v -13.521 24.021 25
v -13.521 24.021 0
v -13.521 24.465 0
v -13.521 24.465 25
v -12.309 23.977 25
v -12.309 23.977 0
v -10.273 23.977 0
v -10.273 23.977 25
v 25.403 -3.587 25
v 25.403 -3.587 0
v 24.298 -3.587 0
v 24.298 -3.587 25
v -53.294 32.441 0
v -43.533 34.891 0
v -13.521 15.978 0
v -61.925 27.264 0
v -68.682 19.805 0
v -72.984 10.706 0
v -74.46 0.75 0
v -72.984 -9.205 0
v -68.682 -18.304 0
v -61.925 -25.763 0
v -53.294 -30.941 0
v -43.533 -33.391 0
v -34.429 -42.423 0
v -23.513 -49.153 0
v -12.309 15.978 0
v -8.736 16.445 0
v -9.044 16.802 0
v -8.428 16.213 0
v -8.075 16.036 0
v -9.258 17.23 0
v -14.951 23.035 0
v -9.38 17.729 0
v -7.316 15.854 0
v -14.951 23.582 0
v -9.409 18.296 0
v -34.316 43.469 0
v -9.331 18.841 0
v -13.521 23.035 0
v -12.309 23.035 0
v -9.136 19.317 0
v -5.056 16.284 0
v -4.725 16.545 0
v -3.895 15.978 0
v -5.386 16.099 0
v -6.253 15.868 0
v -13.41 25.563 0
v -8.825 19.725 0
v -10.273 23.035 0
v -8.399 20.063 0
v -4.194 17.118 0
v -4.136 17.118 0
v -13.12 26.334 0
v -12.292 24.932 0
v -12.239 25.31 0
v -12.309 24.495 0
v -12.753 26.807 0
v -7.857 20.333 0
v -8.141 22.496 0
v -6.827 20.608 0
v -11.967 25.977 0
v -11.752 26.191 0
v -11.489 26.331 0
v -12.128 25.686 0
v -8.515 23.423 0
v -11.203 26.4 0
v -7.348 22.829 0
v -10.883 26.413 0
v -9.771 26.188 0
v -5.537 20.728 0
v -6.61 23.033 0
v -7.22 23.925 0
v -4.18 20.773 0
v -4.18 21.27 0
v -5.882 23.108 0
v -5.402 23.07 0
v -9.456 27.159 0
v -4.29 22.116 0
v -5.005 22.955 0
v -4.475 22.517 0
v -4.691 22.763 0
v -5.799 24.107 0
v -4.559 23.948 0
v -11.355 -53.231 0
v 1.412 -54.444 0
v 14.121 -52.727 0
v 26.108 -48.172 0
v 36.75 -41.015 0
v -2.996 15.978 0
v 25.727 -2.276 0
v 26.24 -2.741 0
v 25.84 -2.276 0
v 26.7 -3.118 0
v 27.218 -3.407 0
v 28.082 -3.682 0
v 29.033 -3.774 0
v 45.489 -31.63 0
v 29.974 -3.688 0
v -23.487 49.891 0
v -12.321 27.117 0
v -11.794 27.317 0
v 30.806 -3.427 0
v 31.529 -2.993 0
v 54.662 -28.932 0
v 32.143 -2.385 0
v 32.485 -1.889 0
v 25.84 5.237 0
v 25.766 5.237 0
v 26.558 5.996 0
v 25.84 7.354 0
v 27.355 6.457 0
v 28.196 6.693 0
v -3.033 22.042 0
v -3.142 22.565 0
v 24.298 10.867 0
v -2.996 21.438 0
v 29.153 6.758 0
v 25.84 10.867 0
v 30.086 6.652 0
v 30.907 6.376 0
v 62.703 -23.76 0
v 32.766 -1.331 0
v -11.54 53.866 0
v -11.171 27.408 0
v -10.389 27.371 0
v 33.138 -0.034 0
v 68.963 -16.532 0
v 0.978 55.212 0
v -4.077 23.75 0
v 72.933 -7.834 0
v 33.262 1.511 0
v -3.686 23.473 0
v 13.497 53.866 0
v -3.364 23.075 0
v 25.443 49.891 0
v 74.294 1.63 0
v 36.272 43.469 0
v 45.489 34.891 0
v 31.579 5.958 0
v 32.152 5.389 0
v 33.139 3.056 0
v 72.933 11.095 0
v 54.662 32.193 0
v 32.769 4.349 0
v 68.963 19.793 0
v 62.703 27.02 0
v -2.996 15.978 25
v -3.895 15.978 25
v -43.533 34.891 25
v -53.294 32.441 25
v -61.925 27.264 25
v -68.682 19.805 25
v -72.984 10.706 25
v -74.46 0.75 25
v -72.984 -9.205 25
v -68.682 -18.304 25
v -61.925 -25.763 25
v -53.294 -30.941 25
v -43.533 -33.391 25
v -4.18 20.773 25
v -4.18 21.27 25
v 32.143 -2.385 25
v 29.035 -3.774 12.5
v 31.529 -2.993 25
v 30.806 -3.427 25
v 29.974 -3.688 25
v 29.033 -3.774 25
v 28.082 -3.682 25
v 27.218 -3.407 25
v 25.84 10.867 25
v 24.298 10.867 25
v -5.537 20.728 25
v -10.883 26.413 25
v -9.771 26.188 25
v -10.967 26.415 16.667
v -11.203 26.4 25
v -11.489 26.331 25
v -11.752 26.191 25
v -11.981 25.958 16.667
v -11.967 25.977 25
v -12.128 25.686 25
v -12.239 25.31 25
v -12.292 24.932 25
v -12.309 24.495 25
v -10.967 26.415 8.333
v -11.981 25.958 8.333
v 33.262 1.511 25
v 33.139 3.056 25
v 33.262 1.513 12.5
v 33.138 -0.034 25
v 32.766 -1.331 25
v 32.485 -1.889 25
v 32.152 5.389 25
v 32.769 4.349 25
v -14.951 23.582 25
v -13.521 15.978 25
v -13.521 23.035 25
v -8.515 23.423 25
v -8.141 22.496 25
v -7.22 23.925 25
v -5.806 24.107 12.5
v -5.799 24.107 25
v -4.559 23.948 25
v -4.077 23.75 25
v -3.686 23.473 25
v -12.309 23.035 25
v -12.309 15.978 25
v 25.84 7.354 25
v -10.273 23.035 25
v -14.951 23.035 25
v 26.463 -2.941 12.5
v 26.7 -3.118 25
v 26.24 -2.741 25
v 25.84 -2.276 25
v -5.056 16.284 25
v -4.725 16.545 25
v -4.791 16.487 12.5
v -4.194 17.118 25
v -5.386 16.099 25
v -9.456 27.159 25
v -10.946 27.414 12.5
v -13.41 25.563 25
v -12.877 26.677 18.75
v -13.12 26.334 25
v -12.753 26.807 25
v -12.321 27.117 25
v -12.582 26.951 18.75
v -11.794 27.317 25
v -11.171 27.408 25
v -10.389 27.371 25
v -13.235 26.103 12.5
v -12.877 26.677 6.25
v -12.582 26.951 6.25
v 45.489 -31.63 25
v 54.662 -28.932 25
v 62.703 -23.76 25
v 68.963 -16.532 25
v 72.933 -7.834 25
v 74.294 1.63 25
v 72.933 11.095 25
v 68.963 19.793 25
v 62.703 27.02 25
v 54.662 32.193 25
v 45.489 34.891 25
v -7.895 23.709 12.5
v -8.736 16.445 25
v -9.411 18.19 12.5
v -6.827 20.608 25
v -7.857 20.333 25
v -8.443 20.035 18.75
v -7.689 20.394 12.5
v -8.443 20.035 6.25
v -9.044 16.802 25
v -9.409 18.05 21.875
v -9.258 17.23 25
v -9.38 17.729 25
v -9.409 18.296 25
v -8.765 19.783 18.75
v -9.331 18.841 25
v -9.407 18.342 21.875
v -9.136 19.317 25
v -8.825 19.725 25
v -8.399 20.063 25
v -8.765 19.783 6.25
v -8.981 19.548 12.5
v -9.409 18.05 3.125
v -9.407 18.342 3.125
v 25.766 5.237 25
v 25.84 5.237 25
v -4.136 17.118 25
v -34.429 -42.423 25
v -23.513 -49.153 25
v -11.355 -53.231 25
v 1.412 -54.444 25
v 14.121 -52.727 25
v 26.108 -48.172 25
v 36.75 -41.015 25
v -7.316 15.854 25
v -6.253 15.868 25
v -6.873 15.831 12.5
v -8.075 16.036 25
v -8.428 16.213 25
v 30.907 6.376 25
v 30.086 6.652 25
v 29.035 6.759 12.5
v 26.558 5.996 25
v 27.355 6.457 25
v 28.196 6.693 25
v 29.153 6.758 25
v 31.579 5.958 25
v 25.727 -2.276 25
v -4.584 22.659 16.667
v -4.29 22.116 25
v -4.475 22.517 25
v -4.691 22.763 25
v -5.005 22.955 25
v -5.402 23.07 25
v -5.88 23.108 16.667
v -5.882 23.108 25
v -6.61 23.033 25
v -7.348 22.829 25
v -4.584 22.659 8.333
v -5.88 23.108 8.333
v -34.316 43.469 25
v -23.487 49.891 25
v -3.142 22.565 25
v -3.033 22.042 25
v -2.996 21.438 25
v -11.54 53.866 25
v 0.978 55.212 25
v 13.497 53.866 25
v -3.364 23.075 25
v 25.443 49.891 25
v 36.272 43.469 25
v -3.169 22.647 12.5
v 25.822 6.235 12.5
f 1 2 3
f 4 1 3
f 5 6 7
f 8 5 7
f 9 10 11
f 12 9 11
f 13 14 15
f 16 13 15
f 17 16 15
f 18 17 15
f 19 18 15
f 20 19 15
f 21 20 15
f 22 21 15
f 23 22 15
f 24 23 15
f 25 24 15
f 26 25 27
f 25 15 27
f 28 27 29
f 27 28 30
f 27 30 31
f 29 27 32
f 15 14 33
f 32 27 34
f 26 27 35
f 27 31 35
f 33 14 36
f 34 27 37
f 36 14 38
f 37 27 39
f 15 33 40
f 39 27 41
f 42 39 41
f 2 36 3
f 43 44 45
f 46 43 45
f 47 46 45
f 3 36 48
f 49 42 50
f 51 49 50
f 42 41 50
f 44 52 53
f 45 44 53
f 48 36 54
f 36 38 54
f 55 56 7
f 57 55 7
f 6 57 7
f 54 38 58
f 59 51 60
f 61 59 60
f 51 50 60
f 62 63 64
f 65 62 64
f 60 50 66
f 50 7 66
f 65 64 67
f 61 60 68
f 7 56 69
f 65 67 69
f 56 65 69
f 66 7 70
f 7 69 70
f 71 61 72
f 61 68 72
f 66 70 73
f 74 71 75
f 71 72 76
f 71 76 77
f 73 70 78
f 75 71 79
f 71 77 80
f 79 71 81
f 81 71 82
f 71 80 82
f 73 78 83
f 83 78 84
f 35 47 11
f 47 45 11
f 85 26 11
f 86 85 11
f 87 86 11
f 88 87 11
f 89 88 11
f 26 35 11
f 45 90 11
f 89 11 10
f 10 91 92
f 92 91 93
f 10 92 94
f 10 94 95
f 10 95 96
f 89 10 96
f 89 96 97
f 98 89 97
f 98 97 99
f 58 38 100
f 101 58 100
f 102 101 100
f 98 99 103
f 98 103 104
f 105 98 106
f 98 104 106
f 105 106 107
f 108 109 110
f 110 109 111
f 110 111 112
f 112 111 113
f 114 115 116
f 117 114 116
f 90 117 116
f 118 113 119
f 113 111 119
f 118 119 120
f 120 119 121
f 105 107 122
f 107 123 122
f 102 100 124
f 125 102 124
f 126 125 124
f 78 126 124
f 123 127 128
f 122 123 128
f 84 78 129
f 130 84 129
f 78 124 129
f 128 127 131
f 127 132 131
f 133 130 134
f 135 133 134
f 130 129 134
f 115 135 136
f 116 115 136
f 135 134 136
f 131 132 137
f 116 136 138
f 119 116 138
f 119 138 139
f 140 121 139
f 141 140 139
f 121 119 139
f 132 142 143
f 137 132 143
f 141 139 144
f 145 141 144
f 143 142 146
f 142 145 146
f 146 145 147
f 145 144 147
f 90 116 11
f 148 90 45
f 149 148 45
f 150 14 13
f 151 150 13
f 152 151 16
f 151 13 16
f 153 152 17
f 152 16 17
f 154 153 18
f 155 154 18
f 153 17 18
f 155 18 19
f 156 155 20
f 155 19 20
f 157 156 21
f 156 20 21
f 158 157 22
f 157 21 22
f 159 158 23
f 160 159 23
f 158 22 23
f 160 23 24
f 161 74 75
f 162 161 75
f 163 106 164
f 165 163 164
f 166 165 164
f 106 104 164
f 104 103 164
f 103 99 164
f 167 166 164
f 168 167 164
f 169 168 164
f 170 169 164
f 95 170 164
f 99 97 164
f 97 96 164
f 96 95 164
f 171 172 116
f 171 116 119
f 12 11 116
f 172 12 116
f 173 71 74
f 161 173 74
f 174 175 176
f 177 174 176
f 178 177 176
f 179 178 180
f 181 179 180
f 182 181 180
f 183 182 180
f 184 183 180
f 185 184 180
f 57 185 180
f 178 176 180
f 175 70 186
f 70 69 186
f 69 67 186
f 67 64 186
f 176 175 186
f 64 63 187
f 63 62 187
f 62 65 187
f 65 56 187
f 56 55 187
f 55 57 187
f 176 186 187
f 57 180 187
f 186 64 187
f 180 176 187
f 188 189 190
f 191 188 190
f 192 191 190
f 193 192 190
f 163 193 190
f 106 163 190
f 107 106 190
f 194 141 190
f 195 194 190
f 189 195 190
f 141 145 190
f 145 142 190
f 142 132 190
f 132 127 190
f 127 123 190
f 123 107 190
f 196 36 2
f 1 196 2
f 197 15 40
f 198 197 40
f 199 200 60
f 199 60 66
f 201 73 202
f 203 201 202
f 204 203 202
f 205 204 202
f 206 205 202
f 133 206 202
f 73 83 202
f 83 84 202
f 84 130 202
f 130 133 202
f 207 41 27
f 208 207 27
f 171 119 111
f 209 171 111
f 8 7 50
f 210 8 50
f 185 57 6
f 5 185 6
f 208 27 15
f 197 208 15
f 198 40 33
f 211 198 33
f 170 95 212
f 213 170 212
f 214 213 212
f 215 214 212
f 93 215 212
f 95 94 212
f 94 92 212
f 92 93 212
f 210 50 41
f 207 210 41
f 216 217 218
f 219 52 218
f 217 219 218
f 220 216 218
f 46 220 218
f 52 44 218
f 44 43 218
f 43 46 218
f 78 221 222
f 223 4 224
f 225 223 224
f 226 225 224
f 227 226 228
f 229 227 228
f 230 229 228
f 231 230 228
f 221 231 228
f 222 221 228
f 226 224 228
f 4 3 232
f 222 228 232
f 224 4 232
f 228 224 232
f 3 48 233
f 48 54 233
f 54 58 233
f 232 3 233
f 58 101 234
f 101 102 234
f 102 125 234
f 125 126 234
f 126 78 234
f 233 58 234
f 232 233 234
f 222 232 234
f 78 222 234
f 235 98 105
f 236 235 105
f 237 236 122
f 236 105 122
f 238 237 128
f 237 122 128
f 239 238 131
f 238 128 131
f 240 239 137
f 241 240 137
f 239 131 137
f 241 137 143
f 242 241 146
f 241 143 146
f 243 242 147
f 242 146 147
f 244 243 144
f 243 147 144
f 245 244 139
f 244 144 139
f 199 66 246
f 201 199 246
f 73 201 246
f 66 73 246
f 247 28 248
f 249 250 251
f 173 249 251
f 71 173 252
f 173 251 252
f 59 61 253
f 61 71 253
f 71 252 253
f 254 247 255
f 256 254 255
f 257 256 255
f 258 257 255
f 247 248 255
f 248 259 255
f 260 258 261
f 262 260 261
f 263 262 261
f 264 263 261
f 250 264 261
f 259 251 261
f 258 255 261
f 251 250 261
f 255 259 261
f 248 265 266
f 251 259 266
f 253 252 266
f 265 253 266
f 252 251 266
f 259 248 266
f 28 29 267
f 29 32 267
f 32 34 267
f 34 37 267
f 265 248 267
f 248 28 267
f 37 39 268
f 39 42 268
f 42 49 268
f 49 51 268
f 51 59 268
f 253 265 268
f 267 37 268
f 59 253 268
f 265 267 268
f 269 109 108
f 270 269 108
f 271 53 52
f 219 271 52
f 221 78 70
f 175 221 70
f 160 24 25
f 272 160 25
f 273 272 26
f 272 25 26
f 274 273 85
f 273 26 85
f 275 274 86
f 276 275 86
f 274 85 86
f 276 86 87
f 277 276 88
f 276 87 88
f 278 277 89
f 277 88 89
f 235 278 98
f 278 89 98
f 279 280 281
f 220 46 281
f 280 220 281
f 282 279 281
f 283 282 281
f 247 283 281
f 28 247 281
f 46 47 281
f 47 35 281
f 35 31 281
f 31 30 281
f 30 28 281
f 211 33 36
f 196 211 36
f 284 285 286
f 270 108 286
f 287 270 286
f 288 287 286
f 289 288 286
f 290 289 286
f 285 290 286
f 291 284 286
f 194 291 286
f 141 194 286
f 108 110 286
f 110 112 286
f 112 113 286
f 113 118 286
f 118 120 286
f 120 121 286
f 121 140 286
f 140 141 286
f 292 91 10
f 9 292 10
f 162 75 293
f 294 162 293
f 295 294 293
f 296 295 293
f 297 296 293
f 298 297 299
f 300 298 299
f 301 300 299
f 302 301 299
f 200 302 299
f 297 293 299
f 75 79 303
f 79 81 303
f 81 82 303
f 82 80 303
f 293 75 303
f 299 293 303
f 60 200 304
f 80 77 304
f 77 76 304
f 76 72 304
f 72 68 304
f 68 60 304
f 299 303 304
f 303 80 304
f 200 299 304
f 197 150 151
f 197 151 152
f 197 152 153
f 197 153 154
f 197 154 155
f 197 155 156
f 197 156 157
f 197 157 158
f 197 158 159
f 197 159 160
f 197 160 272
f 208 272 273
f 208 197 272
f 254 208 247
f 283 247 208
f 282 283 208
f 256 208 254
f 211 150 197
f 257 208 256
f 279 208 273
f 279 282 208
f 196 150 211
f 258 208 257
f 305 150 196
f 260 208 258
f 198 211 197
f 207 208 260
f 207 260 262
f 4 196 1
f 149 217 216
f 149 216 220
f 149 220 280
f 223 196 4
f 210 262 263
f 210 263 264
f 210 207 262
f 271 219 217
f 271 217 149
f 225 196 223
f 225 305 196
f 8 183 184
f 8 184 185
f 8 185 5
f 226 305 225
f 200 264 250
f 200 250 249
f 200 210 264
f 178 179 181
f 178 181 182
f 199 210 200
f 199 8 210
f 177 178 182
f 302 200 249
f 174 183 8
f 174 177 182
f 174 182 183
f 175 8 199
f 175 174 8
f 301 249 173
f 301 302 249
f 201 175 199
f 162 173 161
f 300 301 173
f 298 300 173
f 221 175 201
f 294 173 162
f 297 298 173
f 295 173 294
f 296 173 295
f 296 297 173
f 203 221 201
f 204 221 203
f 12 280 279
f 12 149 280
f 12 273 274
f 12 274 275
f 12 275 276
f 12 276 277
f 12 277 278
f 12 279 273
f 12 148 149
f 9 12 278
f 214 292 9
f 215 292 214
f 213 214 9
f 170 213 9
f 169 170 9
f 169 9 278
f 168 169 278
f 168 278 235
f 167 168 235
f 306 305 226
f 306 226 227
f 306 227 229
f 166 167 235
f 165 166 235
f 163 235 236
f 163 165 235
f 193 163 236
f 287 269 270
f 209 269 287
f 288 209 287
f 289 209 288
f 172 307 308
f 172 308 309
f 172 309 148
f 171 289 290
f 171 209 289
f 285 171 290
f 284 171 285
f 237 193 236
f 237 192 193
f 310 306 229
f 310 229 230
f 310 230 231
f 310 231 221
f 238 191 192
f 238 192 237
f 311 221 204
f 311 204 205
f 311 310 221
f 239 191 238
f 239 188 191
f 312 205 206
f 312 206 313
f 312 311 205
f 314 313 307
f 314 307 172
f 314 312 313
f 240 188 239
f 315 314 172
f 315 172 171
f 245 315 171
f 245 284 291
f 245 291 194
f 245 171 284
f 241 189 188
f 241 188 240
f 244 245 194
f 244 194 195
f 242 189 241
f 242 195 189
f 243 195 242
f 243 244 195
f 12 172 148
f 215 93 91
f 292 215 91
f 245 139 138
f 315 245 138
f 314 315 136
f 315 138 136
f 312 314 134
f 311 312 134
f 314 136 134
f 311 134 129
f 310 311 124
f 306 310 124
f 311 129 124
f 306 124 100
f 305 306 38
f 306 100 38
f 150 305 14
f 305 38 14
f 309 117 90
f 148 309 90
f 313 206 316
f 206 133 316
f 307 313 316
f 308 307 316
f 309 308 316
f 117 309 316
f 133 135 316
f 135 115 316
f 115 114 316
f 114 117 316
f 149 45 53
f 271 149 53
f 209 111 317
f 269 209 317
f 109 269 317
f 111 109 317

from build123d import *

# Parameters (mm, degrees)
F1_DEPTH = 25


with BuildPart() as f1:
    # F0 (on Top) → F1 (new body)
    with BuildSketch(Plane.XY):
        Polygon((-43.5326099396, -33.3906054708), (0, 0), (-43.5326099396, 34.891307354), align=None)
        Polygon((-43.5326099396, 34.891307354), (0, 0), (45.4891324043, 34.891307354), align=None)
        with BuildLine():
            Line((-2.9963482407, 15.9782618284), (-3.8954226515, 15.9782618284))
            Line((-3.8954226515, 15.9782618284), (-4.1359542471, 17.1178678348))
            Line((-4.1359542471, 17.1178678348), (-4.1943357024, 17.1178678348))
            add(Edge.make_bspline(
                [(-4.1943357024, 17.1178678348), (-4.7921618041, 16.3659146913), (-5.3864850185, 16.0985276262)],
                knots=[0, 0, 0, 1, 1, 1], degree=2))
            add(Edge.make_bspline(
                [(-5.3864850185, 16.0985276262), (-5.9808082329, 15.8311405612), (-6.872876869, 15.8311405612)],
                knots=[0, 0, 0, 1, 1, 1], degree=2))
            add(Edge.make_bspline(
                [(-6.872876869, 15.8311405612), (-8.0615232978, 15.8311405612), (-8.7364129205, 16.4453134704)],
                knots=[0, 0, 0, 1, 1, 1], degree=2))
            add(Edge.make_bspline(
                [(-8.7364129205, 16.4453134704), (-9.4113025431, 17.0594863796), (-9.4113025431, 18.1897513531)],
                knots=[0, 0, 0, 1, 1, 1], degree=2))
            add(Edge.make_bspline(
                [(-9.4113025431, 18.1897513531), (-9.4113025431, 20.6114141167), (-5.537109173, 20.7281770272)],
                knots=[0, 0, 0, 1, 1, 1], degree=2))
            Line((-5.537109173, 20.7281770272), (-4.1803241531, 20.7725469332))
            Line((-4.1803241531, 20.7725469332), (-4.1803241531, 21.2699569319))
            add(Edge.make_bspline(
                [(-4.1803241531, 21.2699569319), (-4.1803241531, 22.2110659904), (-4.5843238234, 22.6594355667)],
                knots=[0, 0, 0, 1, 1, 1], degree=2))
            add(Edge.make_bspline(
                [(-4.5843238234, 22.6594355667), (-4.9883234937, 23.107805143), (-5.8803921299, 23.107805143)],
                knots=[0, 0, 0, 1, 1, 1], degree=2))
            add(Edge.make_bspline(
                [(-5.8803921299, 23.107805143), (-6.8798826437, 23.107805143), (-8.140922077, 22.495967492)],
                knots=[0, 0, 0, 1, 1, 1], degree=2))
            Line((-8.140922077, 22.495967492), (-8.5145633905, 23.4230650013))
            add(Edge.make_bspline(
                [(-8.5145633905, 23.4230650013), (-7.9237430635, 23.7429953761), (-7.2196627132, 23.9251455164)],
                knots=[0, 0, 0, 1, 1, 1], degree=2))
            add(Edge.make_bspline(
                [(-7.2196627132, 23.9251455164), (-6.5155823629, 24.1072956568), (-5.8056638671, 24.1072956568)],
                knots=[0, 0, 0, 1, 1, 1], degree=2))
            add(Edge.make_bspline(
                [(-5.8056638671, 24.1072956568), (-4.3764858427, 24.1072956568), (-3.6864170417, 23.4732730528)],
                knots=[0, 0, 0, 1, 1, 1], degree=2))
            add(Edge.make_bspline(
                [(-3.6864170417, 23.4732730528), (-2.9963482407, 22.8392504489), (-2.9963482407, 21.438095523)],
                knots=[0, 0, 0, 1, 1, 1], degree=2))
            Line((-2.9963482407, 21.438095523), (-2.9963482407, 15.9782618284))
        make_face(mode=Mode.SUBTRACT)
        with BuildLine():
            Line((-10.2730128225, 23.9765211971), (-10.2730128225, 23.0354121385))
            Line((-10.2730128225, 23.0354121385), (-12.3093579815, 23.0354121385))
            Line((-12.3093579815, 23.0354121385), (-12.3093579815, 15.9782618284))
            Line((-12.3093579815, 15.9782618284), (-13.5213569924, 15.9782618284))
            Line((-13.5213569924, 15.9782618284), (-13.5213569924, 23.0354121385))
            Line((-13.5213569924, 23.0354121385), (-14.9505350168, 23.0354121385))
            Line((-14.9505350168, 23.0354121385), (-14.9505350168, 23.5818625596))
            Line((-14.9505350168, 23.5818625596), (-13.5213569924, 24.020891103))
            Line((-13.5213569924, 24.020891103), (-13.5213569924, 24.4645901629))
            add(Edge.make_bspline(
                [(-13.5213569924, 24.4645901629), (-13.5213569924, 27.4140212819), (-10.945567187, 27.4140212819)],
                knots=[0, 0, 0, 1, 1, 1], degree=2))
            add(Edge.make_bspline(
                [(-10.945567187, 27.4140212819), (-10.3103769539, 27.4140212819), (-9.4556724491, 27.159478137)],
                knots=[0, 0, 0, 1, 1, 1], degree=2))
            Line((-9.4556724491, 27.159478137), (-9.7709323074, 26.1880107218))
            add(Edge.make_bspline(
                [(-9.7709323074, 26.1880107218), (-10.4715097704, 26.4145307681), (-10.9665845108, 26.4145307681)],
                knots=[0, 0, 0, 1, 1, 1], degree=2))
            add(Edge.make_bspline(
                [(-10.9665845108, 26.4145307681), (-11.6531504245, 26.4145307681), (-11.981254203, 25.9579877881)],
                knots=[0, 0, 0, 1, 1, 1], degree=2))
            add(Edge.make_bspline(
                [(-11.981254203, 25.9579877881), (-12.3093579815, 25.5014448081), (-12.3093579815, 24.4949485196)],
                knots=[0, 0, 0, 1, 1, 1], degree=2))
            Line((-12.3093579815, 24.4949485196), (-12.3093579815, 23.9765211971))
            Line((-12.3093579815, 23.9765211971), (-10.2730128225, 23.9765211971))
        make_face(mode=Mode.SUBTRACT)
        Polygon((45.4891324043, 34.891307354), (0, 0), (45.4891324043, -31.6304340959), align=None)
        with BuildLine():
            add(Edge.make_bspline(
                [(25.8402686661, 5.2373468753), (26.9161857823, 6.759086001), (29.0353264006, 6.759086001)],
                knots=[0, 0, 0, 1, 1, 1], degree=2))
            add(Edge.make_bspline(
                [(29.0353264006, 6.759086001), (31.0415254433, 6.759086001), (32.1516222469, 5.3889263585)],
                knots=[0, 0, 0, 1, 1, 1], degree=2))
            add(Edge.make_bspline(
                [(32.1516222469, 5.3889263585), (33.2617190504, 4.0187667161), (33.2617190504, 1.5132470229)],
                knots=[0, 0, 0, 1, 1, 1], degree=2))
            add(Edge.make_bspline(
                [(33.2617190504, 1.5132470229), (33.2617190504, -0.9952448171), (32.1427058067, -2.3847234133)],
                knots=[0, 0, 0, 1, 1, 1], degree=2))
            add(Edge.make_bspline(
                [(32.1427058067, -2.3847234133), (31.0236925629, -3.7742020095), (29.0353264006, -3.7742020095)],
                knots=[0, 0, 0, 1, 1, 1], degree=2))
            add(Edge.make_bspline(
                [(29.0353264006, -3.7742020095), (28.0396572462, -3.7742020095), (27.2178586754, -3.4071418883)],
                knots=[0, 0, 0, 1, 1, 1], degree=2))
            add(Edge.make_bspline(
                [(27.2178586754, -3.4071418883), (26.3960601046, -3.0400817672), (25.8402686661, -2.2762400577)],
                knots=[0, 0, 0, 1, 1, 1], degree=2))
            Line((25.8402686661, -2.2762400577), (25.7273270904, -2.2762400577))
            Line((25.7273270904, -2.2762400577), (25.4033630968, -3.5869567655))
            Line((25.4033630968, -3.5869567655), (24.2977245133, -3.5869567655))
            Line((24.2977245133, -3.5869567655), (24.2977245133, 10.8665927816))
            Line((24.2977245133, 10.8665927816), (25.8402686661, 10.8665927816))
            Line((25.8402686661, 10.8665927816), (25.8402686661, 7.3535153469))
            add(Edge.make_bspline(
                [(25.8402686661, 7.3535153469), (25.8402686661, 6.1735730952), (25.7659649978, 5.2373468753)],
                knots=[0, 0, 0, 1, 1, 1], degree=2))
            Line((25.7659649978, 5.2373468753), (25.8402686661, 5.2373468753))
        make_face(mode=Mode.SUBTRACT)
        Polygon((45.4891324043, -31.6304340959), (0, 0), (-43.5326099396, -33.3906054708), align=None)
        with BuildLine():
            ThreePointArc((45.4891324043, 34.891307354), (0.9782612324, 55.2115185664), (-43.5326099396, 34.891307354))
            Line((-43.5326099396, 34.891307354), (45.4891324043, 34.891307354))
        make_face()
        with BuildLine():
            Line((-43.5326099396, -33.3906054708), (-43.5326099396, 34.891307354))
            ThreePointArc((-43.5326099396, 34.891307354), (-74.4599689303, 0.7503509416), (-43.5326099396, -33.3906054708))
        make_face()
        with BuildLine():
            ThreePointArc((45.4891324043, -31.6304340959), (74.2935894706, 1.6304366291), (45.4891324043, 34.891307354))
            Line((45.4891324043, 34.891307354), (45.4891324043, -31.6304340959))
        make_face()
        with BuildLine():
            ThreePointArc((-43.5326099396, -33.3906054708), (1.4119301482, -54.4435900738), (45.4891324043, -31.6304340959))
            Line((45.4891324043, -31.6304340959), (-43.5326099396, -33.3906054708))
        make_face()
    extrude(amount=F1_DEPTH)


solid = f1.part
